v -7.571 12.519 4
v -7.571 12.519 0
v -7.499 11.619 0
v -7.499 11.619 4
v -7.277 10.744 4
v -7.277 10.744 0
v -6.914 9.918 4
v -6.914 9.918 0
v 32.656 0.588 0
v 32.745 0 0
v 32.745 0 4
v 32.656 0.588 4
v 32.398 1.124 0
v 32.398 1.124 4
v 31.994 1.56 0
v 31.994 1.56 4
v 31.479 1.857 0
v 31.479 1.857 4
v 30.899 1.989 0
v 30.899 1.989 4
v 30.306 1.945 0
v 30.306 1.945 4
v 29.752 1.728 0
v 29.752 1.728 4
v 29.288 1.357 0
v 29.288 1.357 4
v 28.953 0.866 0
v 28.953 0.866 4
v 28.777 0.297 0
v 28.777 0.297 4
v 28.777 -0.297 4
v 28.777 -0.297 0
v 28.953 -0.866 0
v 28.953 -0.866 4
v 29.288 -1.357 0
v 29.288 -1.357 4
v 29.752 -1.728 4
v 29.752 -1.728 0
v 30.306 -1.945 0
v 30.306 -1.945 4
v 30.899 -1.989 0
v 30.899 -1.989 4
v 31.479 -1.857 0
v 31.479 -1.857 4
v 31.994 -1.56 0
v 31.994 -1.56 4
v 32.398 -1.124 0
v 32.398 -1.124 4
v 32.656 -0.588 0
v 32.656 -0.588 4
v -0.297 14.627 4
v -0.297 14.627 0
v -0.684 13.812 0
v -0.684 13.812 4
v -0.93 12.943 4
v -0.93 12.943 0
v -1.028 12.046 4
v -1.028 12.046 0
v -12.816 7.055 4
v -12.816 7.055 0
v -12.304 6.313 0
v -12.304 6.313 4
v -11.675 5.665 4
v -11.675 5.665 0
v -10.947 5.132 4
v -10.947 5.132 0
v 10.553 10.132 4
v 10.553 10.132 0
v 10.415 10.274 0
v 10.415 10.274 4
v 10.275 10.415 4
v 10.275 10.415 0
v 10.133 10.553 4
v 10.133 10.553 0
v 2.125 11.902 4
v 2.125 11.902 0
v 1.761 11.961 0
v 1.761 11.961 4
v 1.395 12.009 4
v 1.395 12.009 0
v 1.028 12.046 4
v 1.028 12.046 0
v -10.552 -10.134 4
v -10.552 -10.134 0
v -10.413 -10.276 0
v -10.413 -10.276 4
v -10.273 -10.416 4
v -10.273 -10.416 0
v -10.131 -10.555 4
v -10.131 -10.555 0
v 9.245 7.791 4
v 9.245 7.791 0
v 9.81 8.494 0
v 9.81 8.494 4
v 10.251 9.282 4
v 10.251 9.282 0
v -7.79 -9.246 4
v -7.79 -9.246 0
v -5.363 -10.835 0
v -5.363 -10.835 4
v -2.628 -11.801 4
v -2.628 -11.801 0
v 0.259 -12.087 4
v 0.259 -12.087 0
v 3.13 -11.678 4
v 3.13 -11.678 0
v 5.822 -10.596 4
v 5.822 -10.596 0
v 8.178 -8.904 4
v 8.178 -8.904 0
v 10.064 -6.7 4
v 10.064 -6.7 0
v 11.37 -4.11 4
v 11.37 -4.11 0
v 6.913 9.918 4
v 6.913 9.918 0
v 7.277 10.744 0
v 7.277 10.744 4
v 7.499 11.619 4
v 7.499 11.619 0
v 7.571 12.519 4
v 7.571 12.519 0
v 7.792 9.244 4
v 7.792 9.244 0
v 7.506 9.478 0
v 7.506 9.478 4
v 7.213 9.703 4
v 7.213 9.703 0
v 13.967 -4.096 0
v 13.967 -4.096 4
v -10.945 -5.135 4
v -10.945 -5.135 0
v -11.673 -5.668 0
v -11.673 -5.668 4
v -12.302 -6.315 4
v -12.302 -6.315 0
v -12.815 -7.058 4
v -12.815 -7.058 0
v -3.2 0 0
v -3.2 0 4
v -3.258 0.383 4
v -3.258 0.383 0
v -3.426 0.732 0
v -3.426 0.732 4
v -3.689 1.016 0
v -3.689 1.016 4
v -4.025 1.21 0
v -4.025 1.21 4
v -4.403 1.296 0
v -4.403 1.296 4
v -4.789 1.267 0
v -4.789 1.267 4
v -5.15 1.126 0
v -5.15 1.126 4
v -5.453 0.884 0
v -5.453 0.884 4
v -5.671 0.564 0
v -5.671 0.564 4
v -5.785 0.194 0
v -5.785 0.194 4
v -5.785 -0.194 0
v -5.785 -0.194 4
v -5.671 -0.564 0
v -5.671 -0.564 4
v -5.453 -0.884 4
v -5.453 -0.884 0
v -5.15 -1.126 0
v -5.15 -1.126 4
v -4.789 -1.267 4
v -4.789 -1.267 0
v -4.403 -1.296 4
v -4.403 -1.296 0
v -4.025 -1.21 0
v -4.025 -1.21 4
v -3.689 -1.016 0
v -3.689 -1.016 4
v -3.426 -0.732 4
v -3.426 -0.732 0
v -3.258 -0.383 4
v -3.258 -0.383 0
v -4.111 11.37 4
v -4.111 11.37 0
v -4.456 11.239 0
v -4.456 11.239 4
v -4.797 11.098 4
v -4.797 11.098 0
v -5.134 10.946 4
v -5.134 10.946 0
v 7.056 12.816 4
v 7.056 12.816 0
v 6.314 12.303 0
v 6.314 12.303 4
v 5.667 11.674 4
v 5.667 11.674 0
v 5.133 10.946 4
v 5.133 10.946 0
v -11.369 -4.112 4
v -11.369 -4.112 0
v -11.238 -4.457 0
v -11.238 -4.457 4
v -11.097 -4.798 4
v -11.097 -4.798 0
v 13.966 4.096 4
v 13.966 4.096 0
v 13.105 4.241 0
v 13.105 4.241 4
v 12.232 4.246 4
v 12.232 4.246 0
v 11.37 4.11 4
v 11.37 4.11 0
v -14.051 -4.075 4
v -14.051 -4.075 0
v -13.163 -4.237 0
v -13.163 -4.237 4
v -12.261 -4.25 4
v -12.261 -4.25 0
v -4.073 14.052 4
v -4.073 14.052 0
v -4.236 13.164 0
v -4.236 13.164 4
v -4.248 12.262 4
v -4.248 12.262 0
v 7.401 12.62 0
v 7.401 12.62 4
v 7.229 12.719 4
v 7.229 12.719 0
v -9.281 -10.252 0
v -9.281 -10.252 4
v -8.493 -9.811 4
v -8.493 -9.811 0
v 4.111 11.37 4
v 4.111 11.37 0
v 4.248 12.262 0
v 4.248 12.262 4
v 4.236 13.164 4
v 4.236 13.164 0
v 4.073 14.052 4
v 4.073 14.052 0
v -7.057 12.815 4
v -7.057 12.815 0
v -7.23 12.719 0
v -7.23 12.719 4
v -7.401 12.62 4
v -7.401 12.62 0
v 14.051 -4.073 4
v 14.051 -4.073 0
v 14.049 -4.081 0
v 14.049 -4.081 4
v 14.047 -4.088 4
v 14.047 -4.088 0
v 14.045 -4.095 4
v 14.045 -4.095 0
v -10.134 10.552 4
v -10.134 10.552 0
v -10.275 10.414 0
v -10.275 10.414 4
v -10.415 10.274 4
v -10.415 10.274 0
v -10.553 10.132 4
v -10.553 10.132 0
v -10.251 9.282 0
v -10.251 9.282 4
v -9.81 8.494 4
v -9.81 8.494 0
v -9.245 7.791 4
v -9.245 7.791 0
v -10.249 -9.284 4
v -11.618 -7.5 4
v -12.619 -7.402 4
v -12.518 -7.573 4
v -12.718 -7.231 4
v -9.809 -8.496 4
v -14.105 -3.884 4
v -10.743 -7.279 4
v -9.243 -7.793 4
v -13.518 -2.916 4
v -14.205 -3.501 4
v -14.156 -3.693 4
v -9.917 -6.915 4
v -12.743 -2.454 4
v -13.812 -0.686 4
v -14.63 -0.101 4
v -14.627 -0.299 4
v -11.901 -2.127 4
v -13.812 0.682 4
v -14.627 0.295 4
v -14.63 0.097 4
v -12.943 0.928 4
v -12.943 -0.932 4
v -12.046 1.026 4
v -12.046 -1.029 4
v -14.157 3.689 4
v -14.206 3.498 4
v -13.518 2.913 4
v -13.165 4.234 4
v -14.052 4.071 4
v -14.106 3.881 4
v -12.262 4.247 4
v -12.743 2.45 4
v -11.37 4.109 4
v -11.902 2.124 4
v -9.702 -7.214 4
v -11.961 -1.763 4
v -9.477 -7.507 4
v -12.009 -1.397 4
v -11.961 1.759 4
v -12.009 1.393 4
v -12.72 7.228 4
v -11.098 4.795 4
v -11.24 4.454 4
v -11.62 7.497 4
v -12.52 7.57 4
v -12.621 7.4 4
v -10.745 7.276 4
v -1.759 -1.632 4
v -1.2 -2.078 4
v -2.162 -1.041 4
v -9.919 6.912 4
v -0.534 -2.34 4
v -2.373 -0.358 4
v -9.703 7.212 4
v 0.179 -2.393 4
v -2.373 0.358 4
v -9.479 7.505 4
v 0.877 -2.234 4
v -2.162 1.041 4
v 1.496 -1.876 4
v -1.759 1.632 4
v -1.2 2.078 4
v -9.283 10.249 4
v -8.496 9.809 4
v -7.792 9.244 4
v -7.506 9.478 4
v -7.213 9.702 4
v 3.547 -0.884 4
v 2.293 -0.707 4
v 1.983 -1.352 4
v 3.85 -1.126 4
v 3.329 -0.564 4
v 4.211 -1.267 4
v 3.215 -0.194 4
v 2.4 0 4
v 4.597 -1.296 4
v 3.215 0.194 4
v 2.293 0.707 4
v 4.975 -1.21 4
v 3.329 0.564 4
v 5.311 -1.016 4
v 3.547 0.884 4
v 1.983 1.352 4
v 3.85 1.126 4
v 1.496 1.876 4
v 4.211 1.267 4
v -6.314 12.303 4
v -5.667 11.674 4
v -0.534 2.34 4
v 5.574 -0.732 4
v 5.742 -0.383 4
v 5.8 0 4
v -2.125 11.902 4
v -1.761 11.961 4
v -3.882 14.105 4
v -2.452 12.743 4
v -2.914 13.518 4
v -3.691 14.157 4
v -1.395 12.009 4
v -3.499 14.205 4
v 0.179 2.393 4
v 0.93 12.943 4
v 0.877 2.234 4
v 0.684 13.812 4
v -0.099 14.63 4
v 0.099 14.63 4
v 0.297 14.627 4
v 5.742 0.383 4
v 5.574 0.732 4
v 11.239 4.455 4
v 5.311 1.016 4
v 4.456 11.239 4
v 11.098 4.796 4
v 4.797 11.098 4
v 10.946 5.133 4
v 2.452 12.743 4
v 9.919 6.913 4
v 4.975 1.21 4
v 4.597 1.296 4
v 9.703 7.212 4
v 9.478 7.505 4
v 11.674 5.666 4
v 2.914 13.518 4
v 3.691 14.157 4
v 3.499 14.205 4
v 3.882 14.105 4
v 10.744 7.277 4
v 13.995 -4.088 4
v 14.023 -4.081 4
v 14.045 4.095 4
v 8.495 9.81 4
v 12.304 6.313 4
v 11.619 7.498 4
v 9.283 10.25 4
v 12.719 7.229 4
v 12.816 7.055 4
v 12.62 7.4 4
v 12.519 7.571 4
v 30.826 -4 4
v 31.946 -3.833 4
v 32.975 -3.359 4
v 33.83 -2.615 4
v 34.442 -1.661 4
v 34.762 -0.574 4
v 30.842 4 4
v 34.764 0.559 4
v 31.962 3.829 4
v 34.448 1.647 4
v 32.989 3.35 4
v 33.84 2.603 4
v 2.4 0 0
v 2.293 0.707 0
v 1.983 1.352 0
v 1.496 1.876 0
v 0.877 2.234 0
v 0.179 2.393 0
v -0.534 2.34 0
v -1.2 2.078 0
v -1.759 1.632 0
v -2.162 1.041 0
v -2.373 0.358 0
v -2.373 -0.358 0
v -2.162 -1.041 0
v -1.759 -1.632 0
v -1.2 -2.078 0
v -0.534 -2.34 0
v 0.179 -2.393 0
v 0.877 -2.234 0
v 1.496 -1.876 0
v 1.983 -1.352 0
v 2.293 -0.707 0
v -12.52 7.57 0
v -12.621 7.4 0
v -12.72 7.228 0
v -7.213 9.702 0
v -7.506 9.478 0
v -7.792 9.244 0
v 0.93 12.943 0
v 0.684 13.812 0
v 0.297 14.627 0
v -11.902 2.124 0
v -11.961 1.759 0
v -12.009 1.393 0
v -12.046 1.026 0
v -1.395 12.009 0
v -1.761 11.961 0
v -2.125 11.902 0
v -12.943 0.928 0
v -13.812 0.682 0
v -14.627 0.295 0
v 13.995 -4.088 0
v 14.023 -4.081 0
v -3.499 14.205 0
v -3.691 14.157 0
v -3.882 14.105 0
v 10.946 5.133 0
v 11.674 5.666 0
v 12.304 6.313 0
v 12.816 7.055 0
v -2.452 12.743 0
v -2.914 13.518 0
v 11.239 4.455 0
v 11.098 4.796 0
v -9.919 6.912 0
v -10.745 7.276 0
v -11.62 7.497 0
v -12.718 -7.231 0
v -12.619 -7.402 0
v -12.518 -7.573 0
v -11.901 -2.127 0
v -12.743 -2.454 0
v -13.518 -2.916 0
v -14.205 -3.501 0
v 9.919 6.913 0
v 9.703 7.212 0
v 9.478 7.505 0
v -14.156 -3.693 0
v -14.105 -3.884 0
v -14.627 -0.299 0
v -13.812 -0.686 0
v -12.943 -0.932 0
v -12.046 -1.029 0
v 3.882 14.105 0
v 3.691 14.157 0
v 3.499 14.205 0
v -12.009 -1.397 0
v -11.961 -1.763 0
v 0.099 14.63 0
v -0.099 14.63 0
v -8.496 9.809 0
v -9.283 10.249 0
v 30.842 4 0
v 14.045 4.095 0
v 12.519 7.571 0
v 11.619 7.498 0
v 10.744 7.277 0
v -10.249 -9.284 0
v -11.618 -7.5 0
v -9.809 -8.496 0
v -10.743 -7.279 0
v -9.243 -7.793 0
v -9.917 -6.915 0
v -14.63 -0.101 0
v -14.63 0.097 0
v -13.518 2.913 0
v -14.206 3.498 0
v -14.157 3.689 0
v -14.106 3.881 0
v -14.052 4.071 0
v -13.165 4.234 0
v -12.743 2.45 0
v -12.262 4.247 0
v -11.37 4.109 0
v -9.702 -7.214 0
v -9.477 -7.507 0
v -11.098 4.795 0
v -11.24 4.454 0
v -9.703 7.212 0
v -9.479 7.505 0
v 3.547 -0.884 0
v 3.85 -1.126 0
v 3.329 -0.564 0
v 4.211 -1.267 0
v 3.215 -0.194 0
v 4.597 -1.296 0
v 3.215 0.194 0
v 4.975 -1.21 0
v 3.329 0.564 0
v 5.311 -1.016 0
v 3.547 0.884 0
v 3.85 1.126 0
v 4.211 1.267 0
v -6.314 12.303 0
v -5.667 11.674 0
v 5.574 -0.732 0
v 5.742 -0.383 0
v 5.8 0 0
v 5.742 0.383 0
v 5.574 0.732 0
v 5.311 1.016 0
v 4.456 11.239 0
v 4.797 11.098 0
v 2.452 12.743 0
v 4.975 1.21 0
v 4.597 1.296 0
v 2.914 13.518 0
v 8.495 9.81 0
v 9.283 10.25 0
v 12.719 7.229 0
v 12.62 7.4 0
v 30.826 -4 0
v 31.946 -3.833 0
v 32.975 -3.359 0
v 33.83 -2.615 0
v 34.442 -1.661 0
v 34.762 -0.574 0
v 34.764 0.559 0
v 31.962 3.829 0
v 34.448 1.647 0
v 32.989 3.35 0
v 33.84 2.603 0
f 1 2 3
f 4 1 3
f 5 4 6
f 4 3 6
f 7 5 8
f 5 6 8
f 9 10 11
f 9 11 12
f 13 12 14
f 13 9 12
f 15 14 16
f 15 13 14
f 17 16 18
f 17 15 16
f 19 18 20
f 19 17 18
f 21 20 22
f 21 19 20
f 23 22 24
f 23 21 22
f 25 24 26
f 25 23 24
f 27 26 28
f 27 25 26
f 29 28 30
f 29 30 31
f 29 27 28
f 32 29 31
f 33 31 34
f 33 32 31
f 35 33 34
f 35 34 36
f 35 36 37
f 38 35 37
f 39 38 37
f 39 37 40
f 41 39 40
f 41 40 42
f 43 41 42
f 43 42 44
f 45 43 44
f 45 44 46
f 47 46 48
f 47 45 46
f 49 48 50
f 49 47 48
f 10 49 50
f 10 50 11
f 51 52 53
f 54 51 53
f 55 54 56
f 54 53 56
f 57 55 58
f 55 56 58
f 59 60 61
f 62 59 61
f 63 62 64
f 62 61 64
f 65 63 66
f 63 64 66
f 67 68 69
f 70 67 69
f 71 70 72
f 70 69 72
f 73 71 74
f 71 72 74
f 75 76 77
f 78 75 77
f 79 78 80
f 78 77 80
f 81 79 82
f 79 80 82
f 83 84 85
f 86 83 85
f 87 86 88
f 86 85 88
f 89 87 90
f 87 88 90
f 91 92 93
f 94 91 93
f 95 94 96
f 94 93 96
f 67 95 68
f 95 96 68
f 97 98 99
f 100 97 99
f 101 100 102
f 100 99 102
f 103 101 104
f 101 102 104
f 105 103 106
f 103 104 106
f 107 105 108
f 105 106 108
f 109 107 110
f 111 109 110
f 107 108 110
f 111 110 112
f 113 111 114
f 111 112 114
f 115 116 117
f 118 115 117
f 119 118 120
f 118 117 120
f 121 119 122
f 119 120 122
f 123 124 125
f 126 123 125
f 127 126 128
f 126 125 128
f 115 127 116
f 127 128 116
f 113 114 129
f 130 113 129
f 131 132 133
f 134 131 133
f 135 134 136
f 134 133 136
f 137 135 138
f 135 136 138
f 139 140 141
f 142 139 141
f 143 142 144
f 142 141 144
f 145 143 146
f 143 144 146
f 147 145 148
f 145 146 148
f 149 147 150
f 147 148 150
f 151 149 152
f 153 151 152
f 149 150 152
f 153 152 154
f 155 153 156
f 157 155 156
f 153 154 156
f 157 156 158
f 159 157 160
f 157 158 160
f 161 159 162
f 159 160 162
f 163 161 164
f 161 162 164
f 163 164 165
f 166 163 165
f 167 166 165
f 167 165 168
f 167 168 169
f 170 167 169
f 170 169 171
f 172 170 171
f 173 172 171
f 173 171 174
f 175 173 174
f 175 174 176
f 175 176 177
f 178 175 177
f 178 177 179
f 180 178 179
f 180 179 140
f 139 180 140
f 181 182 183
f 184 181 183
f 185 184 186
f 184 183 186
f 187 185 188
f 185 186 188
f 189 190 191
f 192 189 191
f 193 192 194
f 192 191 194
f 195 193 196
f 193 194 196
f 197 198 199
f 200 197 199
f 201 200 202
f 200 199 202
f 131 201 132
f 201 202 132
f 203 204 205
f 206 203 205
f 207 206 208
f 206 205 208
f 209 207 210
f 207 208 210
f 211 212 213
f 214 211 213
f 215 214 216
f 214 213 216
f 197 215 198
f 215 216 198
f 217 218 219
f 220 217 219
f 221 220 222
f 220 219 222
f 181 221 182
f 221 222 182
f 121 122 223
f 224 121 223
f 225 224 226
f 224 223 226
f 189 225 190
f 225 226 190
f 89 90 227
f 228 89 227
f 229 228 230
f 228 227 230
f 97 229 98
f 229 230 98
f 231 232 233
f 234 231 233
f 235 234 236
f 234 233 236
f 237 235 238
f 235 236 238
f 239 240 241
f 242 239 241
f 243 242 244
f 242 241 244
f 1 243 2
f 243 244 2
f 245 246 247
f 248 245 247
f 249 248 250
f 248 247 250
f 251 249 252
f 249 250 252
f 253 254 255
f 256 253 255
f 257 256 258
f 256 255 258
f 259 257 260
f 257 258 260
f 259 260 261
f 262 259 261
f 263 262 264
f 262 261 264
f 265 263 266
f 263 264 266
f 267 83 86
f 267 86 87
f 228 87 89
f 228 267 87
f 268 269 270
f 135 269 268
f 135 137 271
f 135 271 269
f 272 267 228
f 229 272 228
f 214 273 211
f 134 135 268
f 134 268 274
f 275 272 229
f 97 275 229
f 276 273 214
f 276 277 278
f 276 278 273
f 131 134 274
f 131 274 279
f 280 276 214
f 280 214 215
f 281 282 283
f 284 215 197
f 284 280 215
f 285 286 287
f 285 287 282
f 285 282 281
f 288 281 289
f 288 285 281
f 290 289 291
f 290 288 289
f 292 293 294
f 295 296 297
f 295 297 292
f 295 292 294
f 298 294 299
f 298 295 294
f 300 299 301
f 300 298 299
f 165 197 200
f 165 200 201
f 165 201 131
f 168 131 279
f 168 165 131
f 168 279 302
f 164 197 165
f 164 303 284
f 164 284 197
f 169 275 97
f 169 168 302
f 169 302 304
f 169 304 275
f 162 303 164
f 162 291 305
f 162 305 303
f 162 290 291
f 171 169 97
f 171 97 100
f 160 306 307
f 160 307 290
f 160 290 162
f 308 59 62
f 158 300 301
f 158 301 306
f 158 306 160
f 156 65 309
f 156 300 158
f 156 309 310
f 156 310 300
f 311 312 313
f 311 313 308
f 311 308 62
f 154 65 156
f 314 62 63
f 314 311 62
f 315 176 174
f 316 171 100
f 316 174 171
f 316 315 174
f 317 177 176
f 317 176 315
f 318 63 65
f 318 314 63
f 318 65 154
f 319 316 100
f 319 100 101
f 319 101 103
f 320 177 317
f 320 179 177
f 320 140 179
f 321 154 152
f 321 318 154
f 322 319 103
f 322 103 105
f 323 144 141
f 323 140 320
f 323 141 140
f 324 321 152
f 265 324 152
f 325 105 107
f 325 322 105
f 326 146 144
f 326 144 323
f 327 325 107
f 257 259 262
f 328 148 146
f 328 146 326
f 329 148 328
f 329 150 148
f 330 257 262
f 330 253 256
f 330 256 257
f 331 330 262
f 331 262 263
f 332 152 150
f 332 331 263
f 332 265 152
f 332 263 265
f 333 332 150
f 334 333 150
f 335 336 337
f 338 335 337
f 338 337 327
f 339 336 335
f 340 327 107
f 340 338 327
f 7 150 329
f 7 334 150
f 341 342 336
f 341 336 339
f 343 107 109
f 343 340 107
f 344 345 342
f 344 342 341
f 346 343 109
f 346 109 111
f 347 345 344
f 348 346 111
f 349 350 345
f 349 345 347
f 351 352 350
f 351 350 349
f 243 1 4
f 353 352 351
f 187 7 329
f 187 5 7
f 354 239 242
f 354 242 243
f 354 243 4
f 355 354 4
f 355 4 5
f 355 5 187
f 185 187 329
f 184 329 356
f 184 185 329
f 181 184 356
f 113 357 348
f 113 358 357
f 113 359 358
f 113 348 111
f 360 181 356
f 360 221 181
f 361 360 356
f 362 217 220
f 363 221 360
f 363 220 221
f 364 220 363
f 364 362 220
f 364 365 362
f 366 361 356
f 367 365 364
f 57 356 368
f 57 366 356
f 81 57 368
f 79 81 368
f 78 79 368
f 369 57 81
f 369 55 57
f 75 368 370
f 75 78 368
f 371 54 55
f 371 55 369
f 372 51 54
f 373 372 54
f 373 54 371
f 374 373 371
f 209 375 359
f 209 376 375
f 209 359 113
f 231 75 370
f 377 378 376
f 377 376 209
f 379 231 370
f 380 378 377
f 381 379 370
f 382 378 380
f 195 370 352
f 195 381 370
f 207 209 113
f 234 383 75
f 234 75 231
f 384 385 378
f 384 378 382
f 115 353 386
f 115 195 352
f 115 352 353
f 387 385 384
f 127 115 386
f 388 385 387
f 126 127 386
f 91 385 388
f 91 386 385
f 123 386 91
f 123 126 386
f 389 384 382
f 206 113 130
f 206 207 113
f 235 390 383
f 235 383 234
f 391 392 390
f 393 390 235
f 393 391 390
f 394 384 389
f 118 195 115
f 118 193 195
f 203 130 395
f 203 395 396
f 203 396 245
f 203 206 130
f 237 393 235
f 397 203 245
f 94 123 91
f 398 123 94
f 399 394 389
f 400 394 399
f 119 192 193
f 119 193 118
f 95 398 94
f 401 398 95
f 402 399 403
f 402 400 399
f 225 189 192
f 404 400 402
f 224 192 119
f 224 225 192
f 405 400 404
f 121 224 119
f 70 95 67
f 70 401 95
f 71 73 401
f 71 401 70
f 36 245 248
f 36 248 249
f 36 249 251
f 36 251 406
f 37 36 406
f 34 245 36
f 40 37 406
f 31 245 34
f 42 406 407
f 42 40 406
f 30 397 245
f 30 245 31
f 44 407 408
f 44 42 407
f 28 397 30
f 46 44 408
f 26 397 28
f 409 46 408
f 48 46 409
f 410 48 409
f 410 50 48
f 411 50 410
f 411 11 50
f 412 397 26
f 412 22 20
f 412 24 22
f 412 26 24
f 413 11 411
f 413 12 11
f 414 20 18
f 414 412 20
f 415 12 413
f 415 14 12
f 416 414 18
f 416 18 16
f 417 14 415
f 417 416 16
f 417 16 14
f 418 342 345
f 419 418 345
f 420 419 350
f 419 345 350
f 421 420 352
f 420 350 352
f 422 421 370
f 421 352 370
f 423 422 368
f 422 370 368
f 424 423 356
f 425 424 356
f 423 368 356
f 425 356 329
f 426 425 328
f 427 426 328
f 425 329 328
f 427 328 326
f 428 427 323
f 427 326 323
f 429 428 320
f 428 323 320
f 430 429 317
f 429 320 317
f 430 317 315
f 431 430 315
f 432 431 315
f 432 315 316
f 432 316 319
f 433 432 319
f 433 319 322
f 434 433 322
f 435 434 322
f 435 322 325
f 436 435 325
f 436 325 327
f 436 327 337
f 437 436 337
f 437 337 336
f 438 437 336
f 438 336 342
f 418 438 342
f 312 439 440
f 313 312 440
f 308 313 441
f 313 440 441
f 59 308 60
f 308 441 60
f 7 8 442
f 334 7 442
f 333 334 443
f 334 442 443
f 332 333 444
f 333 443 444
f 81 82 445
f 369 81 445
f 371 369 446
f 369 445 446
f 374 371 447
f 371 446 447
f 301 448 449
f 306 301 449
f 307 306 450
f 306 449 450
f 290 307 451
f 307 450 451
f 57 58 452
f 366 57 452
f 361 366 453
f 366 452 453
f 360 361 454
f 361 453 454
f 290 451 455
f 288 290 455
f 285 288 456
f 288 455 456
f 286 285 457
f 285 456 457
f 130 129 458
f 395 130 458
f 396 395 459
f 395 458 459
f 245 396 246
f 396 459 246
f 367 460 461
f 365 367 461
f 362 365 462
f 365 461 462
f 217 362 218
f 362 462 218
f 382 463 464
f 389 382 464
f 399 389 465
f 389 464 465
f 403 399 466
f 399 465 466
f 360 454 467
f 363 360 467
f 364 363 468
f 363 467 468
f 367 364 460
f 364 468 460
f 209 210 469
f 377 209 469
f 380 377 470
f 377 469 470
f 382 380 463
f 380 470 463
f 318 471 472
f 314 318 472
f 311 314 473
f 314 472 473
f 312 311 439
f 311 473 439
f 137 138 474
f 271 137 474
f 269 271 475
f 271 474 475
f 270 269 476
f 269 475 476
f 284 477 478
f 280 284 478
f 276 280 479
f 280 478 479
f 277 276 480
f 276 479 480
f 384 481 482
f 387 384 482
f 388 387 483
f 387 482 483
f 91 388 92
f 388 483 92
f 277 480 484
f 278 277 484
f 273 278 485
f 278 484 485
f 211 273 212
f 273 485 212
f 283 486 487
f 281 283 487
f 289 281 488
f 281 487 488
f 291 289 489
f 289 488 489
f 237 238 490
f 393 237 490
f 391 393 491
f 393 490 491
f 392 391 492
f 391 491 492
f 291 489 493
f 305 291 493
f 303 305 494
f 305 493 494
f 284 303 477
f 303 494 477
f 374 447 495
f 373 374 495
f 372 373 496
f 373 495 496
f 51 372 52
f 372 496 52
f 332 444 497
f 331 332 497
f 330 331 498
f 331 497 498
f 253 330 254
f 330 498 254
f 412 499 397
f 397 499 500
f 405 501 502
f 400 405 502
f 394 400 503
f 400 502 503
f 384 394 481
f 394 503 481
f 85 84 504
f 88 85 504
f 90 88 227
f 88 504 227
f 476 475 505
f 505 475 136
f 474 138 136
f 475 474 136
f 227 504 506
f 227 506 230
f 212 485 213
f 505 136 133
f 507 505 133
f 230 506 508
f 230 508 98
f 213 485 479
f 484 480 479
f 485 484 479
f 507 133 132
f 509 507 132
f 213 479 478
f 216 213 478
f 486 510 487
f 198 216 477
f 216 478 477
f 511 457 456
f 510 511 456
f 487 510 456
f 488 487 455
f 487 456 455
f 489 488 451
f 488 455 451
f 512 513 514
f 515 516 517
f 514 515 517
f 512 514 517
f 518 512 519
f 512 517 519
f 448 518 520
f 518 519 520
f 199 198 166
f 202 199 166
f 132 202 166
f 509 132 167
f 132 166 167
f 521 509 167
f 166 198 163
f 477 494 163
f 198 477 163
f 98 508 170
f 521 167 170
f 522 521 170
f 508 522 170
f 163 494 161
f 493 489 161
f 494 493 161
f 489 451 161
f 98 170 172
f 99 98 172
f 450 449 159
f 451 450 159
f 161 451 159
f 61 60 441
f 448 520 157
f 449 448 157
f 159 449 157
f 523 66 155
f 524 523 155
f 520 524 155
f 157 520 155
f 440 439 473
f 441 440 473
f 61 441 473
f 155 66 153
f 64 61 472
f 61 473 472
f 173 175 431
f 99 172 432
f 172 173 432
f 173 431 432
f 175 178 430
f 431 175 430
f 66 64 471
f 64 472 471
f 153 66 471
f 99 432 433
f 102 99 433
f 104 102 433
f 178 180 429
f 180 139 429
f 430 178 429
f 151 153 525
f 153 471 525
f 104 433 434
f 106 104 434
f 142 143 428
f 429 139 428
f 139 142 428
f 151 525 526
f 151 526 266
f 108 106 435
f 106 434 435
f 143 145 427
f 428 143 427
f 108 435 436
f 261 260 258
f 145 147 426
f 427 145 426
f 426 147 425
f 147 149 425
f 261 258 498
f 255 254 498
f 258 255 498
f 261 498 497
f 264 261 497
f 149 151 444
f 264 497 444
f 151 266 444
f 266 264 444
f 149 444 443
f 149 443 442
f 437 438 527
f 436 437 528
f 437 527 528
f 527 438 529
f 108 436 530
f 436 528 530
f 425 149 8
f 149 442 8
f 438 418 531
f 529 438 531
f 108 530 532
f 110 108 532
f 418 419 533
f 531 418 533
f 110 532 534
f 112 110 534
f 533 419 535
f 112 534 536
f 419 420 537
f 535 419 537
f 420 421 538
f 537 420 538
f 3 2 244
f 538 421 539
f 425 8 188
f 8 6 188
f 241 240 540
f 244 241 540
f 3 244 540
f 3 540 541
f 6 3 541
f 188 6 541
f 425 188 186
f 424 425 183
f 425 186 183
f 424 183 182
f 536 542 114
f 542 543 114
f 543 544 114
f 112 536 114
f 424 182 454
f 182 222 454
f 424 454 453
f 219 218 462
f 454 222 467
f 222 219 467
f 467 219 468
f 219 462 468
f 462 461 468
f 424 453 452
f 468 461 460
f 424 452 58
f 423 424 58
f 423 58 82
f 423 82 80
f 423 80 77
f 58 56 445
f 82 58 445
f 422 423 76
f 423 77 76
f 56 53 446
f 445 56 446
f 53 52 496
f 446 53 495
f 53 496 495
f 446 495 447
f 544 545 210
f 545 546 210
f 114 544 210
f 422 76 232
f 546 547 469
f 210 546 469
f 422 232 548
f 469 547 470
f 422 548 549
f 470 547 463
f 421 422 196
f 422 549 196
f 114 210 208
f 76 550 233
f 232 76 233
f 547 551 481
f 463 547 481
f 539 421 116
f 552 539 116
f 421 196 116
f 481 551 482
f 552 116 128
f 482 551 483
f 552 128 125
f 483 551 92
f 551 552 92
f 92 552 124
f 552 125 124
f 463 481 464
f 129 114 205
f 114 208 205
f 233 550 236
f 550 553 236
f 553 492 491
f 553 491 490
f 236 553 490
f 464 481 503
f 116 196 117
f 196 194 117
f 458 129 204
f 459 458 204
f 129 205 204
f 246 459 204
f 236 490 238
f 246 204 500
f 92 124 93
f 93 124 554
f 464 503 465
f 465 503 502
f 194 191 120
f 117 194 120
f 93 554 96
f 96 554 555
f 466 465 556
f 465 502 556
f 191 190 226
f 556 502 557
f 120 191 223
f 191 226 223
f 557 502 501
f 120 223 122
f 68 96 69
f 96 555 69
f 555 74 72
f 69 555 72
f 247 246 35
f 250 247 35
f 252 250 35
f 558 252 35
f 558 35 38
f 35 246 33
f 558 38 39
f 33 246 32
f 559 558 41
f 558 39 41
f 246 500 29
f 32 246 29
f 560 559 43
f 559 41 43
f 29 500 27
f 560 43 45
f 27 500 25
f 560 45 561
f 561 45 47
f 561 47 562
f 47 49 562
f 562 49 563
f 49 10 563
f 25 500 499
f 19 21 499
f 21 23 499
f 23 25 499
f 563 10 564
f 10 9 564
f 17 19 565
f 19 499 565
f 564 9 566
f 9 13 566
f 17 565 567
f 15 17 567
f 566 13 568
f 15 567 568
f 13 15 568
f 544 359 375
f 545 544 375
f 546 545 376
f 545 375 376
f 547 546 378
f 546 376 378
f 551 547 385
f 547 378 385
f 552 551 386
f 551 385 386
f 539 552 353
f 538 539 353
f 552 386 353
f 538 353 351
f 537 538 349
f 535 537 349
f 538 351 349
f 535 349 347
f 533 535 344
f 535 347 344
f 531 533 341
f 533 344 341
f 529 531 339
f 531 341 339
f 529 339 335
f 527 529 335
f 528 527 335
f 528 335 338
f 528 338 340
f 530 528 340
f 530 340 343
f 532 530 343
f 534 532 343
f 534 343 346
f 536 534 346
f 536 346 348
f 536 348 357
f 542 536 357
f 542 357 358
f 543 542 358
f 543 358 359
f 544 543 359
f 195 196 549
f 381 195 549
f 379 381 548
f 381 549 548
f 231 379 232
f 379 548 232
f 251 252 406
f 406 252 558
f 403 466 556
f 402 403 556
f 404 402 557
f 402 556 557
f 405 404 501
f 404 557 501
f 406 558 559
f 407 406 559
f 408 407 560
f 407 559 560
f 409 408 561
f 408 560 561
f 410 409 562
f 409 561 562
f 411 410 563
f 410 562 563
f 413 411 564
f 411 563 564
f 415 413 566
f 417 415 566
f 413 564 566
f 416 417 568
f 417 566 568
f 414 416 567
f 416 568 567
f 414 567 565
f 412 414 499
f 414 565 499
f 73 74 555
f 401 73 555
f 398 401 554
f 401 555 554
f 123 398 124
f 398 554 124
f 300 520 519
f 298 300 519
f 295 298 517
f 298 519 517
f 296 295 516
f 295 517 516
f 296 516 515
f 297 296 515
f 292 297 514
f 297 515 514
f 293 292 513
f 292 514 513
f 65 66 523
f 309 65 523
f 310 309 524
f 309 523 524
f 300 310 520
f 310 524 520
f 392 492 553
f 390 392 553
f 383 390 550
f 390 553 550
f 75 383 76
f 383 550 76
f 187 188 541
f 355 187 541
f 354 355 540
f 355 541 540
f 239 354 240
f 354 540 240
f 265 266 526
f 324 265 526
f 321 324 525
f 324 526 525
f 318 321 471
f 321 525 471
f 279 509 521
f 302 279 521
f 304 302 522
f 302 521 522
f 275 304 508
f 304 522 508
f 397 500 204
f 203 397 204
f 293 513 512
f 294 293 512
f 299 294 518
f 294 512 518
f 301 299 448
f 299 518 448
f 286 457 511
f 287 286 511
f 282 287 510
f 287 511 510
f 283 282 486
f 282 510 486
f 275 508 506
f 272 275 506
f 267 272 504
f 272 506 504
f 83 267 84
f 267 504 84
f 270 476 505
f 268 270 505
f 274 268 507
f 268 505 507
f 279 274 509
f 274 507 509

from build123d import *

# Parameters (mm, degrees)
SKETCH1_R           = 12.09
SKETCH1_R_2         = 1.75
SKETCH1_R_3         = 1.995
BOSS_EXTRUDE1_DEPTH = 4
SKETCH2_R           = 1.3
SKETCH2_R_2         = 2.4
CUT_EXTRUDE1_DEPTH  = 38.96437919


with BuildPart() as part:
    # Sketch1 → Boss-Extrude1 (new body)
    # profile 1 of 22: a face of its own
    with BuildSketch(Plane.XY):
        Circle(SKETCH1_R)
        Circle(SKETCH1_R_2, mode=Mode.SUBTRACT)
    # profile 2 of 22: a face of its own
    with BuildSketch(Plane.XY):
        with BuildLine():
            ThreePointArc((14.051469909, -4.073462091), (14.048317136, -4.084321933), (14.04515597, -4.095179336))
            Line((14.04515597, -4.095179336), (30.82582707, -3.999919373))
            ThreePointArc((30.82582707, -3.999919373), (34.803112279, -0.008027822), (30.841914591, 3.999828048))
            Line((30.841914591, 3.999828048), (14.04515597, 4.095179336))
            ThreePointArc((14.04515597, 4.095179336), (14.128586435, 3.797360314), (14.205702589, 3.497844187))
            ThreePointArc((14.205702589, 3.497844187), (14.50484412, 1.909554151), (14.626965513, 0.297959519))
            ThreePointArc((14.626965513, 0.297959519), (14.629241359, 0.148987485), (14.63, 0))
            ThreePointArc((14.63, 0), (14.629241116, -0.149011314), (14.626964543, -0.298007168))
            ThreePointArc((14.626964543, -0.298007168), (14.504858624, -1.909443973), (14.20576712, -3.497582099))
            ThreePointArc((14.20576712, -3.497582099), (14.131552306, -3.786308154), (14.051469909, -4.073462091))
        make_face()
        with Locations((30.75, 0)):
            Circle(SKETCH1_R_3, mode=Mode.SUBTRACT)
    # profile 3 of 22: a face of its own
    with BuildSketch(Plane.XY):
        with BuildLine():
            ThreePointArc((14.205702589, 3.497844187), (14.128586435, 3.797360314), (14.04515597, 4.095179336))
            Line((14.04515597, 4.095179336), (13.966164937, 4.095627749))
            Line((13.966164937, 4.095627749), (11.369827915, 4.11036655))
            ThreePointArc((11.369827915, 4.11036655), (11.678097516, 3.128919686), (11.901816808, 2.124819208))
            ThreePointArc((11.901816808, 2.124819208), (13.1403578, 2.666023245), (14.205702589, 3.497844187))
        make_face()
    # profile 4 of 22: a face of its own
    with BuildSketch(Plane.XY):
        with BuildLine():
            ThreePointArc((-12.517636695, -7.572692492), (-11.175984377, -7.407777173), (-9.917325106, -6.914821961))
            ThreePointArc((-9.917325106, -6.914821961), (-10.469253219, -6.046721181), (-10.945386333, -5.134843524))
            ThreePointArc((-10.945386333, -5.134843524), (-12.001489862, -5.978375477), (-12.815033037, -7.057749518))
            ThreePointArc((-12.815033037, -7.057749518), (-12.668951436, -7.31673216), (-12.517636695, -7.572692492))
        make_face()
    # profile 5 of 22: a face of its own
    with BuildSketch(Plane.XY):
        with BuildLine():
            ThreePointArc((-14.051145033, -4.074582586), (-12.712516328, -4.262616236), (-11.369129658, -4.112297512))
            ThreePointArc((-11.369129658, -4.112297512), (-11.677558471, -3.130930876), (-11.901445615, -2.126897335))
            ThreePointArc((-11.901445615, -2.126897335), (-13.139881298, -2.668425004), (-14.205038564, -3.500539874))
            ThreePointArc((-14.205038564, -3.500539874), (-14.13100701, -3.788342761), (-14.051145033, -4.074582586))
        make_face()
    # profile 6 of 22: a face of its own
    with BuildSketch(Plane.XY):
        with BuildLine():
            ThreePointArc((-14.626950262, -0.298707293), (-13.382615157, -0.826868574), (-12.046093246, -1.029435529))
            ThreePointArc((-12.046093246, -1.029435529), (-12.089999882, -0.001686428), (-12.046379968, 1.026074882))
            ThreePointArc((-12.046379968, 1.026074882), (-13.382791491, 0.823465153), (-14.62701917, 0.295313712))
            ThreePointArc((-14.62701917, 0.295313712), (-14.629999902, -0.00169714), (-14.626950262, -0.298707293))
        make_face()
    # profile 7 of 22: a face of its own
    with BuildSketch(Plane.XY):
        with BuildLine():
            ThreePointArc((-14.205774364, 3.497552675), (-13.140565234, 2.66528054), (-11.902026335, 2.123645243))
            ThreePointArc((-11.902026335, 2.123645243), (-11.678416405, 3.127729251), (-11.370260409, 4.109170017))
            ThreePointArc((-11.370260409, 4.109170017), (-12.71360248, 4.259309779), (-14.052145793, 4.071129894))
            ThreePointArc((-14.052145793, 4.071129894), (-14.131870386, 3.78512079), (-14.205774364, 3.497552675))
        make_face()
    # profile 8 of 22: a face of its own
    with BuildSketch(Plane.XY):
        with BuildLine():
            ThreePointArc((-9.919135011, 6.912225448), (-11.177872267, 7.404913556), (-12.519533027, 7.569556974))
            ThreePointArc((-12.519533027, 7.569556974), (-12.670533379, 7.313992337), (-12.816317544, 7.055416686))
            ThreePointArc((-12.816317544, 7.055416686), (-12.00284137, 5.975783406), (-10.94671211, 5.132016561))
            ThreePointArc((-10.94671211, 5.132016561), (-10.470825179, 6.043998682), (-9.919135011, 6.912225448))
        make_face()
    # profile 9 of 22: a face of its own
    with BuildSketch(Plane.XY):
        with BuildLine():
            ThreePointArc((-7.791898403, 9.244155952), (-8.880242473, 10.045843984), (-10.13359017, 10.552120653))
            ThreePointArc((-10.13359017, 10.552120653), (-10.345575707, 10.344368676), (-10.553302948, 10.1323589))
            ThreePointArc((-10.553302948, 10.1323589), (-10.04699158, 8.878969486), (-9.245249077, 7.790601357))
            ThreePointArc((-9.245249077, 7.790601357), (-8.549520677, 8.54832125), (-7.791898403, 9.244155952))
        make_face()
    # profile 10 of 22: a face of its own
    with BuildSketch(Plane.XY):
        with BuildLine():
            ThreePointArc((-5.133551517, 10.945992364), (-5.977311447, 12.002061971), (-7.05691548, 12.815492339))
            ThreePointArc((-7.05691548, 12.815492339), (-7.315469666, 12.669680484), (-7.571012334, 12.518652972))
            ThreePointArc((-7.571012334, 12.518652972), (-7.40634855, 11.176941958), (-6.913615931, 9.918165897))
            ThreePointArc((-6.913615931, 9.918165897), (-6.045466706, 10.469977665), (-5.133551517, 10.945992364))
        make_face()
    # profile 11 of 22: a face of its own
    with BuildSketch(Plane.XY):
        with BuildLine():
            ThreePointArc((-2.125311093, 11.901728982), (-2.666957342, 13.14020836), (-3.499215334, 14.205364904))
            ThreePointArc((-3.499215334, 14.205364904), (-3.786765286, 14.131429817), (-4.072755654, 14.051674682))
            ThreePointArc((-4.072755654, 14.051674682), (-4.260931239, 12.713077321), (-4.110760617, 11.369685446))
            ThreePointArc((-4.110760617, 11.369685446), (-3.129363382, 11.677978627), (-2.125311093, 11.901728982))
        make_face()
    # profile 12 of 22: a face of its own
    with BuildSketch(Plane.XY):
        with BuildLine():
            ThreePointArc((1.027754616, 12.046236775), (0.825159863, 13.382704508), (0.296996585, 14.626985097))
            ThreePointArc((0.296996585, 14.626985097), (0, 14.63), (-0.296996585, 14.626985097))
            ThreePointArc((-0.296996585, 14.626985097), (-0.825159863, 13.382704508), (-1.027754616, 12.046236775))
            ThreePointArc((-1.027754616, 12.046236775), (0, 12.09), (1.027754616, 12.046236775))
        make_face()
    # profile 13 of 22: a face of its own
    with BuildSketch(Plane.XY):
        with BuildLine():
            ThreePointArc((4.110717434, 11.369701059), (4.260994095, 12.713043392), (4.072942889, 14.051620413))
            ThreePointArc((4.072942889, 14.051620413), (3.786710214, 14.131444574), (3.498915331, 14.2054388))
            ThreePointArc((3.498915331, 14.2054388), (2.666773966, 13.14023428), (2.125244746, 11.901740829))
            ThreePointArc((2.125244746, 11.901740829), (3.129308654, 11.677993293), (4.110717434, 11.369701059))
        make_face()
    # profile 14 of 22: a face of its own
    with BuildSketch(Plane.XY):
        with BuildLine():
            ThreePointArc((6.913450185, 9.91828143), (7.406352802, 11.176909529), (7.571236986, 12.518517105))
            ThreePointArc((7.571236986, 12.518517105), (7.315275528, 12.669792577), (7.056292749, 12.81583523))
            ThreePointArc((7.056292749, 12.81583523), (5.976880257, 12.002254067), (5.133331053, 10.946095756))
            ThreePointArc((5.133331053, 10.946095756), (6.045273784, 10.470089058), (6.913450185, 9.91828143))
        make_face()
    # profile 15 of 22: a face of its own
    with BuildSketch(Plane.XY):
        with BuildLine():
            ThreePointArc((9.244954117, 7.790951378), (10.046869152, 8.879052728), (10.553440202, 10.132215942))
            ThreePointArc((10.553440202, 10.132215942), (10.345229175, 10.344715236), (10.132740224, 10.552936821))
            ThreePointArc((10.132740224, 10.552936821), (8.879594749, 10.046380548), (7.791503622, 9.244488699))
            ThreePointArc((7.791503622, 9.244488699), (8.549176321, 8.548665641), (9.244954117, 7.790951378))
        make_face()
    # profile 16 of 22: a face of its own
    with BuildSketch(Plane.XY):
        with BuildLine():
            ThreePointArc((10.946374382, 5.132736881), (12.002615026, 5.976132183), (12.81632055, 7.055411226))
            ThreePointArc((12.81632055, 7.055411226), (12.670115094, 7.314716911), (12.518663963, 7.570994161))
            ThreePointArc((12.518663963, 7.570994161), (11.17714698, 7.405952739), (9.918639175, 6.912936924))
            ThreePointArc((9.918639175, 6.912936924), (10.47040953, 6.044718709), (10.946374382, 5.132736881))
        make_face()
    # profile 17 of 22: a face of its own
    with BuildSketch(Plane.XY):
        with BuildLine():
            ThreePointArc((12.046231207, -1.027819886), (11.986581537, -1.577961676), (11.901820644, -2.124797724))
            ThreePointArc((11.901820644, -2.124797724), (13.140374441, -2.665881604), (14.20576712, -3.497582099))
            ThreePointArc((14.20576712, -3.497582099), (14.504858624, -1.909443973), (14.626964543, -0.298007168))
            ThreePointArc((14.626964543, -0.298007168), (13.382627003, -0.825679814), (12.046231207, -1.027819886))
        make_face()
    # profile 18 of 22: a face of its own
    with BuildSketch(Plane.XY):
        with BuildLine():
            ThreePointArc((11.901820644, -2.124797724), (11.67810034, -3.128909147), (11.369827915, -4.11036655))
            Line((11.369827915, -4.11036655), (13.967019497, -4.095622898))
            ThreePointArc((13.967019497, -4.095622898), (14.009289492, -4.084713176), (14.051469909, -4.073462091))
            ThreePointArc((14.051469909, -4.073462091), (14.131552306, -3.786308154), (14.20576712, -3.497582099))
            ThreePointArc((14.20576712, -3.497582099), (13.140374441, -2.665881604), (11.901820644, -2.124797724))
        make_face()
    # profile 19 of 22: a face of its own
    with BuildSketch(Plane.XY):
        with BuildLine():
            ThreePointArc((12.09, 0), (12.079052845, -0.514375696), (12.046231207, -1.027819886))
            ThreePointArc((12.046231207, -1.027819886), (13.382627003, -0.825679814), (14.626964543, -0.298007168))
            ThreePointArc((14.626964543, -0.298007168), (14.629241116, -0.149011314), (14.63, 0))
            ThreePointArc((14.63, 0), (14.629241359, 0.148987485), (14.626965513, 0.297959519))
            ThreePointArc((14.626965513, 0.297959519), (13.382629481, 0.825632028), (12.046235232, 1.027772701))
            ThreePointArc((12.046235232, 1.027772701), (12.079053853, 0.514352039), (12.09, 0))
        make_face()
    # profile 20 of 22: a face of its own
    with BuildSketch(Plane.XY):
        with BuildLine():
            ThreePointArc((11.901816808, 2.124819208), (11.986583203, 1.577949019), (12.046235232, 1.027772701))
            ThreePointArc((12.046235232, 1.027772701), (13.382629481, 0.825632028), (14.626965513, 0.297959519))
            ThreePointArc((14.626965513, 0.297959519), (14.50484412, 1.909554151), (14.205702589, 3.497844187))
            ThreePointArc((14.205702589, 3.497844187), (13.1403578, 2.666023245), (11.901816808, 2.124819208))
        make_face()
    # profile 21 of 22: a face of its own
    with BuildSketch(Plane.XY):
        with BuildLine():
            Line((11.369827915, 4.11036655), (13.966164937, 4.095627749))
            ThreePointArc((13.966164937, 4.095627749), (12.668895431, 4.261362771), (11.369827915, 4.11036655))
        make_face()
    # profile 22 of 22: a face of its own
    with BuildSketch(Plane.XY):
        with BuildLine():
            ThreePointArc((-10.130994605, -10.554612656), (-8.877796666, -10.047999865), (-7.789679206, -9.246026058))
            ThreePointArc((-7.789679206, -9.246026058), (-8.547489799, -8.550351931), (-9.243417598, -7.792774288))
            ThreePointArc((-9.243417598, -7.792774288), (-10.045261463, -8.880834456), (-10.55179143, -10.133932978))
            ThreePointArc((-10.55179143, -10.133932978), (-10.343531911, -10.346412306), (-10.130994605, -10.554612656))
        make_face()
    extrude(amount=BOSS_EXTRUDE1_DEPTH)

    # Sketch2 → Cut-Extrude1 (cut, through all)
    with BuildSketch(Plane.XY.offset(4)):
        with Locations((4.5, 0)):
            Circle(SKETCH2_R)
        with Locations((-4.5, 0)):
            Circle(SKETCH2_R)
        Circle(SKETCH2_R_2)
    extrude(amount=-CUT_EXTRUDE1_DEPTH, mode=Mode.SUBTRACT)


solid = part.part
